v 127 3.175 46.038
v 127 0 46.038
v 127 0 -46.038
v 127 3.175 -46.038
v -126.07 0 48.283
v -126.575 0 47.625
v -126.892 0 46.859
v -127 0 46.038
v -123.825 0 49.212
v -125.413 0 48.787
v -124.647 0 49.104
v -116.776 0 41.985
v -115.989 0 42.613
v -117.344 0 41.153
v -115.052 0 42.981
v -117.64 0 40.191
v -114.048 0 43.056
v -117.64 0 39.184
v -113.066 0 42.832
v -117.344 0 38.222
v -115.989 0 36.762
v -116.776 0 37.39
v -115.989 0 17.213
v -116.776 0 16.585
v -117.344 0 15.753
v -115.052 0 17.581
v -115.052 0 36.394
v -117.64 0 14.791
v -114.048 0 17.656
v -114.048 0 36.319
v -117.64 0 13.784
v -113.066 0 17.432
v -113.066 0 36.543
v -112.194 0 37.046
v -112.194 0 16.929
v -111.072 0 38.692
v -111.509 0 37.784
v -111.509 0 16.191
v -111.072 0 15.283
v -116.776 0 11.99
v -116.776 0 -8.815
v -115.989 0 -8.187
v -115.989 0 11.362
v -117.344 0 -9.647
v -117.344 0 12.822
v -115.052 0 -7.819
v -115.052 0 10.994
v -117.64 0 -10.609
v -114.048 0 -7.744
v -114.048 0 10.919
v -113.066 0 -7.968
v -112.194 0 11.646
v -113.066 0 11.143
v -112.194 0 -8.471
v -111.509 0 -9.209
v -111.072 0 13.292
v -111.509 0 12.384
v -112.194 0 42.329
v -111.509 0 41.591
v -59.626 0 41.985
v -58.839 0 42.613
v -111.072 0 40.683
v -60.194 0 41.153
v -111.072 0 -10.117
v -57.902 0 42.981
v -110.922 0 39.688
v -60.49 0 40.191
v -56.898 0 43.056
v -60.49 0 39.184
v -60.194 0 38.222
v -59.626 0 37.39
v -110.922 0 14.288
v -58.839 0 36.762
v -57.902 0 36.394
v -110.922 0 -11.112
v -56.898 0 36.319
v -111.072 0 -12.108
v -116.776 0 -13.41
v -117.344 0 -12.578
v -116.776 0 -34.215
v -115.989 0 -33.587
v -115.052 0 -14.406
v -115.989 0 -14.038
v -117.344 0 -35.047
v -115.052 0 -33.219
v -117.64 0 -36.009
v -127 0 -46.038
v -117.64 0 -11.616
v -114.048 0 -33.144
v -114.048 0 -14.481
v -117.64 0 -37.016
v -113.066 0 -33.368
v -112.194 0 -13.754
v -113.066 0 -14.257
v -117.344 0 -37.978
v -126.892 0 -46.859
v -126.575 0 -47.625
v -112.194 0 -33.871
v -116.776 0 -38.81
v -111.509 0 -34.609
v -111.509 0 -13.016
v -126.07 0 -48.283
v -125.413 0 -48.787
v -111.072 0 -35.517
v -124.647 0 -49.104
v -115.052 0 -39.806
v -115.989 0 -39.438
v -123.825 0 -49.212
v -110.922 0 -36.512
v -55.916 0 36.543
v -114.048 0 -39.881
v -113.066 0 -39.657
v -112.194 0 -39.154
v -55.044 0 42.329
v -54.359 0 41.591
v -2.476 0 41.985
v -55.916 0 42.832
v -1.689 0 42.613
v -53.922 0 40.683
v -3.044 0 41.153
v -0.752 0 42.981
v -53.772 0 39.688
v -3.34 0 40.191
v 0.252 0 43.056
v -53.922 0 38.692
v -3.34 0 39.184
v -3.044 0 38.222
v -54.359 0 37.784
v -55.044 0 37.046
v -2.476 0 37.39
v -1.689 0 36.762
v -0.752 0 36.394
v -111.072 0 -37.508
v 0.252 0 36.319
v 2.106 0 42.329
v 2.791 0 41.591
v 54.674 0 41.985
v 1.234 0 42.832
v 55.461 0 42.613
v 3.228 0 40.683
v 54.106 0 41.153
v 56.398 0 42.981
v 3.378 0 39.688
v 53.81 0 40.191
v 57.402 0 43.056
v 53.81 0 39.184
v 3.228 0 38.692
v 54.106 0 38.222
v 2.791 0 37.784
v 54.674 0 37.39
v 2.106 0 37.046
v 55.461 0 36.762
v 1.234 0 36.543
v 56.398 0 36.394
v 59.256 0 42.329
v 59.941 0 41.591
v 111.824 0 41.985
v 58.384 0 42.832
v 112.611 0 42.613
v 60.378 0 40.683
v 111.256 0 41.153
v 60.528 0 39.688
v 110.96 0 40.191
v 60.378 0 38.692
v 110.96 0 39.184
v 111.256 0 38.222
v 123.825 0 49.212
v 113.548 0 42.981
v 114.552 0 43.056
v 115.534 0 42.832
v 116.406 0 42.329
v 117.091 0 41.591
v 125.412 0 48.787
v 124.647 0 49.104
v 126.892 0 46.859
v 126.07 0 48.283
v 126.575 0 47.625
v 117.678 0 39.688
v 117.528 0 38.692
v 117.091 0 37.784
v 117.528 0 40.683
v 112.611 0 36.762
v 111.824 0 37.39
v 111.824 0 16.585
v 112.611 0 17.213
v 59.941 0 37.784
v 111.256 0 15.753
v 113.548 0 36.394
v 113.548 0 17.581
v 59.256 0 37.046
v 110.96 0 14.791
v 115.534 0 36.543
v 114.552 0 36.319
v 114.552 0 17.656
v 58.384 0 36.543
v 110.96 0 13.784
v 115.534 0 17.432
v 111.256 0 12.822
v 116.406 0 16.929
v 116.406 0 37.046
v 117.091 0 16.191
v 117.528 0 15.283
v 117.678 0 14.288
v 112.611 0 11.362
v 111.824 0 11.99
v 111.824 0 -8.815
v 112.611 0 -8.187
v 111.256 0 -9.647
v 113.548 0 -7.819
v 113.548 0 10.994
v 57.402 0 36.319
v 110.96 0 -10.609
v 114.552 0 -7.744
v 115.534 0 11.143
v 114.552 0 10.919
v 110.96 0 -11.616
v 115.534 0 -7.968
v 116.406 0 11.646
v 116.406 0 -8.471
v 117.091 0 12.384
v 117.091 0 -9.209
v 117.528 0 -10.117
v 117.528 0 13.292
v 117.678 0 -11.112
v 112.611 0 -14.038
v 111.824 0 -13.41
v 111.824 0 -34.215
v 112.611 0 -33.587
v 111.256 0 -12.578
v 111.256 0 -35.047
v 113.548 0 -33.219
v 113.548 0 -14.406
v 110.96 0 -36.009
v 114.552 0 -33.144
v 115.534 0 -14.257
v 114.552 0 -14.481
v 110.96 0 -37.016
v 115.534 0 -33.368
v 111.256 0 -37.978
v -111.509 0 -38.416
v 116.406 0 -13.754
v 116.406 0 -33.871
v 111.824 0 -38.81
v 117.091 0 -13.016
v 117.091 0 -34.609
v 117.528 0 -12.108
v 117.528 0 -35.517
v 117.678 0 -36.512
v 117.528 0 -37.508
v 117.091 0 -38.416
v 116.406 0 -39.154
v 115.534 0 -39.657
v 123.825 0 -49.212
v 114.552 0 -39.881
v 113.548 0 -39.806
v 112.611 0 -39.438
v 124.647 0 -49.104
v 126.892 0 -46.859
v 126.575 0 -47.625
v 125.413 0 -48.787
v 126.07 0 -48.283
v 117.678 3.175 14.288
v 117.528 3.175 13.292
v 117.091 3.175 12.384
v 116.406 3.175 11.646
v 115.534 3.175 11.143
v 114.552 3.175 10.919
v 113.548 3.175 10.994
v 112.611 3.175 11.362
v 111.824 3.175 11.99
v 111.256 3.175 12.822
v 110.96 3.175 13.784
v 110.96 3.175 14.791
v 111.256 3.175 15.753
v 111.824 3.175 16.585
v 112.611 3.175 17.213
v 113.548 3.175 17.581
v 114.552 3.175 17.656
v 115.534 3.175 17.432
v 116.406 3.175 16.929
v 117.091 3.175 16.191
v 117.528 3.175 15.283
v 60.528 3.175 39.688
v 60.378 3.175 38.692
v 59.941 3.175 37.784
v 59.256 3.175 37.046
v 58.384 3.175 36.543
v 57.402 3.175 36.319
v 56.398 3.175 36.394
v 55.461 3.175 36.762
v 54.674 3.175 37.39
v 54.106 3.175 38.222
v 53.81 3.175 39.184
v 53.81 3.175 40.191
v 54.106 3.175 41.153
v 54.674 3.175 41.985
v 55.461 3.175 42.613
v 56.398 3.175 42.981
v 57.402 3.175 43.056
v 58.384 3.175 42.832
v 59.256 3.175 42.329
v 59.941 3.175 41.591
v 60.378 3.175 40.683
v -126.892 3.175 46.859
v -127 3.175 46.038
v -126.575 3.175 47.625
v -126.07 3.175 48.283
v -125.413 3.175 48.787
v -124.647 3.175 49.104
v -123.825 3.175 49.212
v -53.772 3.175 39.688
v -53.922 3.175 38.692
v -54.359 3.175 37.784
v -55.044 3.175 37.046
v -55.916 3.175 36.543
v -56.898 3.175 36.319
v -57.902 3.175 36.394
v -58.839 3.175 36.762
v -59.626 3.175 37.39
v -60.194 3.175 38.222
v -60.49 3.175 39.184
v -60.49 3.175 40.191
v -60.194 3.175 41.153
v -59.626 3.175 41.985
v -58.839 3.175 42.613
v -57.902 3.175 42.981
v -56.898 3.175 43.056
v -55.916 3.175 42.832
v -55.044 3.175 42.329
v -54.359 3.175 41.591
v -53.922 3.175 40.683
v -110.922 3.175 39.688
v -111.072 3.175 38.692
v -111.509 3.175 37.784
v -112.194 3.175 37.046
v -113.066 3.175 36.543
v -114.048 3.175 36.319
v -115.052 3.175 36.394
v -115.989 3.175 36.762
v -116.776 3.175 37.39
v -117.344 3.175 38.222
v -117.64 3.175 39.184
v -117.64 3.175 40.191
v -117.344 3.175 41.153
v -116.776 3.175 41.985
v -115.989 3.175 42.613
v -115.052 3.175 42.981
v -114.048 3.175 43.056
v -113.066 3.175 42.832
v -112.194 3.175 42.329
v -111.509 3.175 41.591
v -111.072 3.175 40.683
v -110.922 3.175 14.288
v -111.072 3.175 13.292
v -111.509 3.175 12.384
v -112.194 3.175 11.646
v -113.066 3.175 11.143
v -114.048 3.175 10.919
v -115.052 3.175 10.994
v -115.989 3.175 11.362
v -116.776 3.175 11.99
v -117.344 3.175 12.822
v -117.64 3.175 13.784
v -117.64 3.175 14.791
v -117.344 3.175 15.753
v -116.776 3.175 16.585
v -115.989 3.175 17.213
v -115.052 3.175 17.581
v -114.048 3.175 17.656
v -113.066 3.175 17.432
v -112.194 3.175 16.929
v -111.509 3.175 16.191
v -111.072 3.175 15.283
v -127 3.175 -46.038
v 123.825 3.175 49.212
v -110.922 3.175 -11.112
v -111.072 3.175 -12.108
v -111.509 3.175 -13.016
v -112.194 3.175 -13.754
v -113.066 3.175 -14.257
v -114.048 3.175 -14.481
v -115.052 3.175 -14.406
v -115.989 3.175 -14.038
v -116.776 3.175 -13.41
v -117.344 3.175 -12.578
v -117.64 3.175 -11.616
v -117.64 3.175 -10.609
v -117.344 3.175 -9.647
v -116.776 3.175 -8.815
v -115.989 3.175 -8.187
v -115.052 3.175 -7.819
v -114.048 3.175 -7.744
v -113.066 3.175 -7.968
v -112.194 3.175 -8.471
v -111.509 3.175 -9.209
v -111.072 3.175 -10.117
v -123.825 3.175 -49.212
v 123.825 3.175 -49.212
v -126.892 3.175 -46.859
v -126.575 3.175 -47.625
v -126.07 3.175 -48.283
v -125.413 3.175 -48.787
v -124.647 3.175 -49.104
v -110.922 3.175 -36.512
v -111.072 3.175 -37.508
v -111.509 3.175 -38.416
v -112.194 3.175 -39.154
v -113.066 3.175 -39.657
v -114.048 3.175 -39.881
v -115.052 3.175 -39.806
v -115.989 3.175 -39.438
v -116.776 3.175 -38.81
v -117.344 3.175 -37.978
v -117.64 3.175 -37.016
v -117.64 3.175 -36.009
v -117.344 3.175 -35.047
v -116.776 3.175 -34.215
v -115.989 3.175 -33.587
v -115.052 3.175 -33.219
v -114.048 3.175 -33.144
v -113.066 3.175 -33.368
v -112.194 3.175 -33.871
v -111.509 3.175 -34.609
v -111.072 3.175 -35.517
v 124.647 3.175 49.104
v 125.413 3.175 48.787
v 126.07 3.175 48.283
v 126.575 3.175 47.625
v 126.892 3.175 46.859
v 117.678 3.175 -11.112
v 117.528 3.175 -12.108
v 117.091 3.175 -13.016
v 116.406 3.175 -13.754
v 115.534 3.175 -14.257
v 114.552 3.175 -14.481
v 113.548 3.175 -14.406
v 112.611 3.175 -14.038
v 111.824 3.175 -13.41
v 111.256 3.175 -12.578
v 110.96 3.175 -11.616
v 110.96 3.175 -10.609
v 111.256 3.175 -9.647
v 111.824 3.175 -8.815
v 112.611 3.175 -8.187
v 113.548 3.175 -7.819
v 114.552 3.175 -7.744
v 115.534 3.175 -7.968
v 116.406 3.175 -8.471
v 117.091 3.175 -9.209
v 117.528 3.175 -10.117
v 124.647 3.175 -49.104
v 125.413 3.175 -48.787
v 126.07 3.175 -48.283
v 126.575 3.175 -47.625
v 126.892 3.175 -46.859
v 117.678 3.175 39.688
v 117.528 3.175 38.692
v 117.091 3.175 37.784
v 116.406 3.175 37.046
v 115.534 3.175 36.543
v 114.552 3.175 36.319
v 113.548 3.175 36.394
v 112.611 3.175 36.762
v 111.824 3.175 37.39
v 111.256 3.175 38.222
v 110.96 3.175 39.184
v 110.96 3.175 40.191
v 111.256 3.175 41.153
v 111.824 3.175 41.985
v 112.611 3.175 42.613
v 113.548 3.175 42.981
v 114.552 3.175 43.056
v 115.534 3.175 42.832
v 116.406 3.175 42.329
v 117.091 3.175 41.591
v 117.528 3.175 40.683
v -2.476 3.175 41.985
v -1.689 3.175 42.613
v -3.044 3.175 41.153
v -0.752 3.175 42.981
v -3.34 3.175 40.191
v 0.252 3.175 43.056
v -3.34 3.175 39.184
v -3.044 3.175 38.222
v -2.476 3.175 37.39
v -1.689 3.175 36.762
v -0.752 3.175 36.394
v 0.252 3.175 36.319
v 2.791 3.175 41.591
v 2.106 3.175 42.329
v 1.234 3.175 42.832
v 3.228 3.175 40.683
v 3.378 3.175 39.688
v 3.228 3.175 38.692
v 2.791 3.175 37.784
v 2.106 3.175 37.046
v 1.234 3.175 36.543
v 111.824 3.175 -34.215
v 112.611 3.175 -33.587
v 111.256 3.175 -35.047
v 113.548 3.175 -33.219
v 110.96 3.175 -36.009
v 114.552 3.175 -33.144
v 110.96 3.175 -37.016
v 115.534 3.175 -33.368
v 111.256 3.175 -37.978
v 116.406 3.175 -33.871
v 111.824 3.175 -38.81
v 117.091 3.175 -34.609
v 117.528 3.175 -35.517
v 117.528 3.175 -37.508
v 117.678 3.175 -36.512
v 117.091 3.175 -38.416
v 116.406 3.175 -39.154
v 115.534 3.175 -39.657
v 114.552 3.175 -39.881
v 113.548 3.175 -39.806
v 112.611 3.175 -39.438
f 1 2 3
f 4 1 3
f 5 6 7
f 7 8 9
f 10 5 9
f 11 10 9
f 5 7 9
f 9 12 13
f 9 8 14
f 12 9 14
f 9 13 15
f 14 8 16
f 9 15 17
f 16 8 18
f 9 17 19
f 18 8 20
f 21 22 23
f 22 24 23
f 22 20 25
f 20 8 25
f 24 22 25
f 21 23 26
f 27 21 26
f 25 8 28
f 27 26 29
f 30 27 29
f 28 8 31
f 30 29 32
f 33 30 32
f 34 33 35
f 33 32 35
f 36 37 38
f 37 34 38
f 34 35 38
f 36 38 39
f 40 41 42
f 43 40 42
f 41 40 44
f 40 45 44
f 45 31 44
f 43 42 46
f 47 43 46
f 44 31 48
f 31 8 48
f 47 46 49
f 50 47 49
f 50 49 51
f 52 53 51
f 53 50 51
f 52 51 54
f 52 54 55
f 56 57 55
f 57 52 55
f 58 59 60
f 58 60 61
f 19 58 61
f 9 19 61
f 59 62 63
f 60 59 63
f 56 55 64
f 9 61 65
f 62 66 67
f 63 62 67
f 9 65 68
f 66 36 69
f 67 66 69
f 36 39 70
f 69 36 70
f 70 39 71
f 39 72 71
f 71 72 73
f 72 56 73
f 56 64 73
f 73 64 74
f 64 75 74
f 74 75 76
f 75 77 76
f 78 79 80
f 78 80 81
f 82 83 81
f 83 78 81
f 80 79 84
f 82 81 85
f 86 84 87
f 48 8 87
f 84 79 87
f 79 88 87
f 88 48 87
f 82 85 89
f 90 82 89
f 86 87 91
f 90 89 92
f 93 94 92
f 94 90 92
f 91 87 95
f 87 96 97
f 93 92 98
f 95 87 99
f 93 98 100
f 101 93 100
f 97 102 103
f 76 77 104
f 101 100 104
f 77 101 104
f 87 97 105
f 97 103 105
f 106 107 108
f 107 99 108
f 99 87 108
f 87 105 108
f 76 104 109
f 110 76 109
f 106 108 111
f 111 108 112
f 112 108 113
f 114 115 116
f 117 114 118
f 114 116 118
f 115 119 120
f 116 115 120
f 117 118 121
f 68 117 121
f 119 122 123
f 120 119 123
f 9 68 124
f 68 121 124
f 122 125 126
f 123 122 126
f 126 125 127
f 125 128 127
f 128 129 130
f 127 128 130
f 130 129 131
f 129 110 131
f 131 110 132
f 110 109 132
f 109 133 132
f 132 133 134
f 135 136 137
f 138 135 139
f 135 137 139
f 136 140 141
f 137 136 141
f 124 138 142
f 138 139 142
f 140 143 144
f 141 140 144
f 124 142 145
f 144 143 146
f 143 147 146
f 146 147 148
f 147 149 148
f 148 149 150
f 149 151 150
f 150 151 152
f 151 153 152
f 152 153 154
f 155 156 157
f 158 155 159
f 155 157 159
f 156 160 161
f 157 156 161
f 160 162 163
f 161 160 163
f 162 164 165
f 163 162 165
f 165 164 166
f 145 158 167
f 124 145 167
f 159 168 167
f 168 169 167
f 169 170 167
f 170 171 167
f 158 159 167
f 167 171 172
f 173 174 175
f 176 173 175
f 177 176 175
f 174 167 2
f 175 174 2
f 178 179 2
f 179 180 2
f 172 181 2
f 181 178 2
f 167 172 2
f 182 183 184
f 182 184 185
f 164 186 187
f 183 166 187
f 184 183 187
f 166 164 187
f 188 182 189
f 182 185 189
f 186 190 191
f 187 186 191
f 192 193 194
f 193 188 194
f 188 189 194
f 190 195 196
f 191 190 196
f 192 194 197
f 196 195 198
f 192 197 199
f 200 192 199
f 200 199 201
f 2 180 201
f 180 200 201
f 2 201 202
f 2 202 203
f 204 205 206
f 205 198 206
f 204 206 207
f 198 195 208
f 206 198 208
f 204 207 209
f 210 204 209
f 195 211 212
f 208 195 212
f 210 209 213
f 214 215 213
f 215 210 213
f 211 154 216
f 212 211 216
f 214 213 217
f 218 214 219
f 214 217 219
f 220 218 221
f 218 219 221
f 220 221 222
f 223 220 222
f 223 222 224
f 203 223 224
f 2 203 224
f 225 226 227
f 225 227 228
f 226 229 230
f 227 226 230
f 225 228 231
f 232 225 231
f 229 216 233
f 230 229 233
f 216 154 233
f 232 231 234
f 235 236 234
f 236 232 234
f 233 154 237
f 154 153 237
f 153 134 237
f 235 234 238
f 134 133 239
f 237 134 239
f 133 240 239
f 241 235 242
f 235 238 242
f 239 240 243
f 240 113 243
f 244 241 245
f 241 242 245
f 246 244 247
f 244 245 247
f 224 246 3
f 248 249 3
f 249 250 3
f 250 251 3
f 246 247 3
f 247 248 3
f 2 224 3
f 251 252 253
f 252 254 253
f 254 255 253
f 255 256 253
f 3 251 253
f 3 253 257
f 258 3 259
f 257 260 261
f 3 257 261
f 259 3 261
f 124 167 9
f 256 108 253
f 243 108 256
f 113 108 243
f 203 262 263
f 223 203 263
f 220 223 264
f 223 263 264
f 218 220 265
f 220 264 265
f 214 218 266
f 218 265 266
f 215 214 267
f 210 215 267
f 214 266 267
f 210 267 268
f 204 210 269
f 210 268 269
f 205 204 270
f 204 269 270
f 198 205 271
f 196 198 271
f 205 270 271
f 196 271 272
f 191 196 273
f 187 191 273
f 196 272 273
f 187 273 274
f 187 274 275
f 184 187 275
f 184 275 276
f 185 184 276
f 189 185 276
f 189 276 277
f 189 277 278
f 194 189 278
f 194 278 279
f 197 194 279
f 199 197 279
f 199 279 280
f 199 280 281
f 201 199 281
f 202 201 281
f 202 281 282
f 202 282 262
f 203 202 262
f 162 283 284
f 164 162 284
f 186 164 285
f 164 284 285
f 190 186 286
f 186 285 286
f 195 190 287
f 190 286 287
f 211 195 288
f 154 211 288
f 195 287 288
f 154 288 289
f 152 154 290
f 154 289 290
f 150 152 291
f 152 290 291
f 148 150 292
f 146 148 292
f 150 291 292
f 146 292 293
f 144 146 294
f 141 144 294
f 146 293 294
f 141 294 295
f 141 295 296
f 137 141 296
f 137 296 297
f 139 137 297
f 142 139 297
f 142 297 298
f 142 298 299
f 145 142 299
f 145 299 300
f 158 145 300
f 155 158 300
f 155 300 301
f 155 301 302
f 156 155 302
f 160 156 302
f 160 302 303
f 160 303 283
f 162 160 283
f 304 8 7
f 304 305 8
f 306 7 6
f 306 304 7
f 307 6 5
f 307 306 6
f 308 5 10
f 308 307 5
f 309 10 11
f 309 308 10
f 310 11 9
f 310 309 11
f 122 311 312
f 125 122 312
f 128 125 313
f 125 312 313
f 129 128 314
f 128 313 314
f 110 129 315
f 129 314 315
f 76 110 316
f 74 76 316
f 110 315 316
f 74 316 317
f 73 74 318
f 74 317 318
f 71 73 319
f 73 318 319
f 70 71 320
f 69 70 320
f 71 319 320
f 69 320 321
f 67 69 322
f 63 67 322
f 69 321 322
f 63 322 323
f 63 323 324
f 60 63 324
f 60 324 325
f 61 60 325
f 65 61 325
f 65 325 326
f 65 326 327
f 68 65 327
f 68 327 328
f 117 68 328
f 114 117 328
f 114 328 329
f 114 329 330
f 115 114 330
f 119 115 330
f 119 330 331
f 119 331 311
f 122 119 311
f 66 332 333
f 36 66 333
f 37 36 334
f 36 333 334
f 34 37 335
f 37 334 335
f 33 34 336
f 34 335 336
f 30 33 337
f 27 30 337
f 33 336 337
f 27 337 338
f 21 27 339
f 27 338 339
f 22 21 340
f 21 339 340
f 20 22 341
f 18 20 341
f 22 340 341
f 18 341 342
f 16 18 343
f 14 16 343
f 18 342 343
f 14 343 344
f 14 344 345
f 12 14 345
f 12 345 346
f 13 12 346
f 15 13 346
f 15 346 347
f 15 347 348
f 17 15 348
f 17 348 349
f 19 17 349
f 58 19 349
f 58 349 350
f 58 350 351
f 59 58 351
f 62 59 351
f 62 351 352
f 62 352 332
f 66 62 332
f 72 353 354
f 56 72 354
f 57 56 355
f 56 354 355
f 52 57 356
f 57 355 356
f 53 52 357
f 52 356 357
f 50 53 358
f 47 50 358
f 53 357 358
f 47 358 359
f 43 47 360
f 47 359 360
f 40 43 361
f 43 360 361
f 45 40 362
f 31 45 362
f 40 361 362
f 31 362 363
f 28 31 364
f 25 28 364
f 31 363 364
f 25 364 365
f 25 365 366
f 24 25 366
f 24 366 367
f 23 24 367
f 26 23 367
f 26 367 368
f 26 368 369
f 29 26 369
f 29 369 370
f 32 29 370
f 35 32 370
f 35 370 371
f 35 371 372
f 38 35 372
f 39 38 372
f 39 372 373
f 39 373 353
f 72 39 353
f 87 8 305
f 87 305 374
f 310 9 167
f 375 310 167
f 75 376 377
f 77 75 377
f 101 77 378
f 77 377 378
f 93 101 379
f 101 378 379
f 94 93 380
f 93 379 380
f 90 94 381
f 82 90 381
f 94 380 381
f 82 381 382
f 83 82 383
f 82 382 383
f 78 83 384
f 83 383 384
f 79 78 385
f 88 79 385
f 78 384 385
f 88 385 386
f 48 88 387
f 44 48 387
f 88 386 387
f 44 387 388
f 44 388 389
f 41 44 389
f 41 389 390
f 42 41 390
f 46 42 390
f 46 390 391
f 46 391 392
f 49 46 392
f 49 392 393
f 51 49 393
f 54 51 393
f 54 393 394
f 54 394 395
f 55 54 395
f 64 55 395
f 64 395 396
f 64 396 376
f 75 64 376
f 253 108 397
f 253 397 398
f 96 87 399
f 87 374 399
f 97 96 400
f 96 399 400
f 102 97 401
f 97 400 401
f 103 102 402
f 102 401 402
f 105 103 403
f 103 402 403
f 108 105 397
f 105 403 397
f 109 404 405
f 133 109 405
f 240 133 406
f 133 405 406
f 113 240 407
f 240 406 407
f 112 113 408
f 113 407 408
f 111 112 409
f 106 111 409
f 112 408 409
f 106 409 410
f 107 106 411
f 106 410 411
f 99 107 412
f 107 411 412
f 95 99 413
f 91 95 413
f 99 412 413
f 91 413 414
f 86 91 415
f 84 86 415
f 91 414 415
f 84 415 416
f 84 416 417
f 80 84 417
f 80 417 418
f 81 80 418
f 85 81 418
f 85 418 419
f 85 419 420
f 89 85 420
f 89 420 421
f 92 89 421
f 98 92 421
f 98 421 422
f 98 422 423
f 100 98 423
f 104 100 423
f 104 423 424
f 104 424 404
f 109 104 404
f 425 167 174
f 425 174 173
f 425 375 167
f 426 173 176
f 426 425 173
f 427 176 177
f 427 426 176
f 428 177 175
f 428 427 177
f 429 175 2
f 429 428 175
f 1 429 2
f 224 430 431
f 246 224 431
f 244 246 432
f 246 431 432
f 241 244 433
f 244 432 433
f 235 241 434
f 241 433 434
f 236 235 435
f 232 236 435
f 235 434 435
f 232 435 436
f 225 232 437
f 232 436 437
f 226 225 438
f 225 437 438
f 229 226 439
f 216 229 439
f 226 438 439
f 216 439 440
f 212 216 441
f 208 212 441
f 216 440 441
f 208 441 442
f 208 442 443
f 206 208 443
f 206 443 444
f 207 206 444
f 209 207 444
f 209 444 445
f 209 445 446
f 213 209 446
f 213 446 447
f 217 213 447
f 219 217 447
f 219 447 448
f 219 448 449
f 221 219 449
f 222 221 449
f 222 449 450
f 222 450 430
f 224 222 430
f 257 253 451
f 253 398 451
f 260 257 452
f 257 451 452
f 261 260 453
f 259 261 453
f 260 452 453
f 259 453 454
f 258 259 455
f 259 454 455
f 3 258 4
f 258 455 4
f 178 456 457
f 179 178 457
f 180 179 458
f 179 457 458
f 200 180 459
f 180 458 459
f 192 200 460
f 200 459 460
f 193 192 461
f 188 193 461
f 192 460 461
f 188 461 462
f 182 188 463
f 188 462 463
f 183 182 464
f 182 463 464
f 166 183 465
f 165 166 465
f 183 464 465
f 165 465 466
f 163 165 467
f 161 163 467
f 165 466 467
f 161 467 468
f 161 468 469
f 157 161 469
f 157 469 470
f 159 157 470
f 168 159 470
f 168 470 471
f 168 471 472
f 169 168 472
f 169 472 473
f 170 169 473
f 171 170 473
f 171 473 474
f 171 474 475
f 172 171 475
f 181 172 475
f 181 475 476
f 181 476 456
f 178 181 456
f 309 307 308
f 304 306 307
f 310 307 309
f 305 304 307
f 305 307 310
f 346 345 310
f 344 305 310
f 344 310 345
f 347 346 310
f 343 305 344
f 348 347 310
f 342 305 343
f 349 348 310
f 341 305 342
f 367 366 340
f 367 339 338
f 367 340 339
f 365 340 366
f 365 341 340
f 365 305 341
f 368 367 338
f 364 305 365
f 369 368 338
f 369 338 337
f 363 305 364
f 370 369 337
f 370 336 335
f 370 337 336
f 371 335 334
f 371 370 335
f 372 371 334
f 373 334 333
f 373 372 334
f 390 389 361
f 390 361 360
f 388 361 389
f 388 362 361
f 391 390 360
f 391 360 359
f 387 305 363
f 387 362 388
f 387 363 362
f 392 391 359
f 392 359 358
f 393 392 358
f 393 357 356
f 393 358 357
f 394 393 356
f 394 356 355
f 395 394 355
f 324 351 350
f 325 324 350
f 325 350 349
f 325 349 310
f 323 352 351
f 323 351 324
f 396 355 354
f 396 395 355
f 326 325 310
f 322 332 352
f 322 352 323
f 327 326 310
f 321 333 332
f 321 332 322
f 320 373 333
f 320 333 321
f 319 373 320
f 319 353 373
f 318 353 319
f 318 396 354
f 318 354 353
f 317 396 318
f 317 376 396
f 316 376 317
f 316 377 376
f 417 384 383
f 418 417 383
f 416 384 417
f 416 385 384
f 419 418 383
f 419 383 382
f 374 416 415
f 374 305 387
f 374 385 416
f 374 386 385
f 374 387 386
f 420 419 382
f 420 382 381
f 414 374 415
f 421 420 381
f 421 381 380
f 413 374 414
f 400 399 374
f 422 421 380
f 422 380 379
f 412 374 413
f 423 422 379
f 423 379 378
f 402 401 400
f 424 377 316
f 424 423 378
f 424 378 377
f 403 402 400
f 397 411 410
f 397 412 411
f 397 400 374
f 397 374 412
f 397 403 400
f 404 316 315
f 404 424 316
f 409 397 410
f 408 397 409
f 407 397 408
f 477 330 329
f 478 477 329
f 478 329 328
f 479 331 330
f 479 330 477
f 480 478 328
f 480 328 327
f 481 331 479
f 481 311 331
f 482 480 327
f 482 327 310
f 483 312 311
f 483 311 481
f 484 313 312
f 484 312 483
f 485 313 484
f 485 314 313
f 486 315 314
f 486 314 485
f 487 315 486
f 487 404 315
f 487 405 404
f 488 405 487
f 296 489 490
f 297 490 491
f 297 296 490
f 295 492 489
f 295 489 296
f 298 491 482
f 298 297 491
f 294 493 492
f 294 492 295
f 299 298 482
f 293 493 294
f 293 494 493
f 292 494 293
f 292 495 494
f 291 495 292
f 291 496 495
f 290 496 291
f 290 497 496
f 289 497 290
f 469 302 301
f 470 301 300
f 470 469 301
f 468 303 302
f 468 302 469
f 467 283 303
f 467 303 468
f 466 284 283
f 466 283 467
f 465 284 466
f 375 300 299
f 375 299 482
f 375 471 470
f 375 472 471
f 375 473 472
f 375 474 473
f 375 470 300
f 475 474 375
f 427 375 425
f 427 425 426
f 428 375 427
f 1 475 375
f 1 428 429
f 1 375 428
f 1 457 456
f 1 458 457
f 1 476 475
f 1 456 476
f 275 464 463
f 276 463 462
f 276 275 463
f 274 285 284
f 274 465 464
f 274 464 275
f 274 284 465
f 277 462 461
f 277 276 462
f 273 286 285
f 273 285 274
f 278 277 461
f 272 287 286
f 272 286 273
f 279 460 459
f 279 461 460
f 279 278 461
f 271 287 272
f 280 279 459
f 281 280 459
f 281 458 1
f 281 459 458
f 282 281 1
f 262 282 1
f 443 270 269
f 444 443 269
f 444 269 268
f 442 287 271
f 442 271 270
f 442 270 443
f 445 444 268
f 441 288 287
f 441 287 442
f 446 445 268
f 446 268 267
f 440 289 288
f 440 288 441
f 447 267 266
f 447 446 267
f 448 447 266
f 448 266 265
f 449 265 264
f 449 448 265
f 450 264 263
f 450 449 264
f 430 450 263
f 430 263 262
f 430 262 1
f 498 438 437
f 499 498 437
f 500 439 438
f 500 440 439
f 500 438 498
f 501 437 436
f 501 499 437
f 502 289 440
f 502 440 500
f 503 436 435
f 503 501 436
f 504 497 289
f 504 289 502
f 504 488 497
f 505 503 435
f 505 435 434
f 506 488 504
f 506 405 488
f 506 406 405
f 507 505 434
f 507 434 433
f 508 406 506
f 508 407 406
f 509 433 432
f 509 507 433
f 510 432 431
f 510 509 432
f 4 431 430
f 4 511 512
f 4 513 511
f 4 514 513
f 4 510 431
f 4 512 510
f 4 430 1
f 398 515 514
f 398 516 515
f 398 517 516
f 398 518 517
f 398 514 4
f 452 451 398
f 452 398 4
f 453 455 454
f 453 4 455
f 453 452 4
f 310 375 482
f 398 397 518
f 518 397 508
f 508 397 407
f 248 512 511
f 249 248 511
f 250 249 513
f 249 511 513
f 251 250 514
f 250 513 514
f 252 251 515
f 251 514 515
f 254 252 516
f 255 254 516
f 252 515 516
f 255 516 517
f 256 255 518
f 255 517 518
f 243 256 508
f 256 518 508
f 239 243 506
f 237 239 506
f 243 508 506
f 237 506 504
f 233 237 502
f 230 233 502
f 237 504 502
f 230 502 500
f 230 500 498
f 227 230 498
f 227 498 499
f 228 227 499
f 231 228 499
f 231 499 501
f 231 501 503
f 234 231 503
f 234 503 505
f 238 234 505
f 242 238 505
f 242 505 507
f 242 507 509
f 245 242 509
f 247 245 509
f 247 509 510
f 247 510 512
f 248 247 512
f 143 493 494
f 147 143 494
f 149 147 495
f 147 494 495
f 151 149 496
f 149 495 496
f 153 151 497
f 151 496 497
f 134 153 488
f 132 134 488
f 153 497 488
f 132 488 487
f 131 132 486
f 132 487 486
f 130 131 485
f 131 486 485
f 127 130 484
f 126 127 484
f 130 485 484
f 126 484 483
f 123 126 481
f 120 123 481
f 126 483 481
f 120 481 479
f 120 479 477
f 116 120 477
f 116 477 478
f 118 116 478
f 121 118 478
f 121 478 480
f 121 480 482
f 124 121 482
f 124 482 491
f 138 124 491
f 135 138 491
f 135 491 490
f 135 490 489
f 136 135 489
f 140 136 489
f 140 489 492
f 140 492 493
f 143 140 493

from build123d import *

# Parameters (mm, degrees)
SKETCH1_W                     = 254
SKETCH1_H                     = 98.425
SKETCH1_R                     = 6.35
BOSS_EXTRUDE1_DEPTH           = 3.175
TAP_DRILL_FOR_1_4_HELICOIL2_D = 6.7564
FILLET1_R                     = 3.175


with BuildPart() as part:
    # Sketch1 → Boss-Extrude1 (new body)
    # profile 1 of 2: a face of its own
    with BuildSketch(Plane(origin=(0, 0, 0), x_dir=(1, 0, 0), z_dir=(0, 1, 0))):
        Rectangle(SKETCH1_W, SKETCH1_H)
        with Locations((-114.3, 36.5125)):
            Circle(SKETCH1_R, mode=Mode.SUBTRACT)
    # profile 2 of 2: a face of its own
    with BuildSketch(Plane(origin=(0, 0, 0), x_dir=(1, 0, 0), z_dir=(0, 1, 0))):
        with Locations((-114.3, 36.5125)):
            Circle(SKETCH1_R)
    extrude(amount=BOSS_EXTRUDE1_DEPTH)

    # Tap Drill for 1/4 Helicoil2 (through all)
    with Locations(Plane(origin=(0, 0, 0), x_dir=(-1, 0, 0), z_dir=(0, -1, 0))):
        with Locations((-114.3, 36.5125), (-114.3, 11.1125), (-114.3, -14.2875), (-57.15, -39.6875), (0, -39.6875), (57.15, -39.6875), (114.3, -14.2875), (114.3, 11.1125), (114.3, 36.5125), (114.3, -39.6875), (-114.3, -39.6875)):
            Hole(TAP_DRILL_FOR_1_4_HELICOIL2_D / 2)

    # Fillet1
    fillet1_edges = [part.edges().sort_by_distance(p)[0] for p in [
        (-127, 1.5875, 49.2125),
        (-127, 1.5875, -49.2125),
        (127, 1.5875, -49.2125),
        (127, 1.5875, 49.2125),
    ]]
    fillet(fillet1_edges, radius=FILLET1_R)


solid = part.part
